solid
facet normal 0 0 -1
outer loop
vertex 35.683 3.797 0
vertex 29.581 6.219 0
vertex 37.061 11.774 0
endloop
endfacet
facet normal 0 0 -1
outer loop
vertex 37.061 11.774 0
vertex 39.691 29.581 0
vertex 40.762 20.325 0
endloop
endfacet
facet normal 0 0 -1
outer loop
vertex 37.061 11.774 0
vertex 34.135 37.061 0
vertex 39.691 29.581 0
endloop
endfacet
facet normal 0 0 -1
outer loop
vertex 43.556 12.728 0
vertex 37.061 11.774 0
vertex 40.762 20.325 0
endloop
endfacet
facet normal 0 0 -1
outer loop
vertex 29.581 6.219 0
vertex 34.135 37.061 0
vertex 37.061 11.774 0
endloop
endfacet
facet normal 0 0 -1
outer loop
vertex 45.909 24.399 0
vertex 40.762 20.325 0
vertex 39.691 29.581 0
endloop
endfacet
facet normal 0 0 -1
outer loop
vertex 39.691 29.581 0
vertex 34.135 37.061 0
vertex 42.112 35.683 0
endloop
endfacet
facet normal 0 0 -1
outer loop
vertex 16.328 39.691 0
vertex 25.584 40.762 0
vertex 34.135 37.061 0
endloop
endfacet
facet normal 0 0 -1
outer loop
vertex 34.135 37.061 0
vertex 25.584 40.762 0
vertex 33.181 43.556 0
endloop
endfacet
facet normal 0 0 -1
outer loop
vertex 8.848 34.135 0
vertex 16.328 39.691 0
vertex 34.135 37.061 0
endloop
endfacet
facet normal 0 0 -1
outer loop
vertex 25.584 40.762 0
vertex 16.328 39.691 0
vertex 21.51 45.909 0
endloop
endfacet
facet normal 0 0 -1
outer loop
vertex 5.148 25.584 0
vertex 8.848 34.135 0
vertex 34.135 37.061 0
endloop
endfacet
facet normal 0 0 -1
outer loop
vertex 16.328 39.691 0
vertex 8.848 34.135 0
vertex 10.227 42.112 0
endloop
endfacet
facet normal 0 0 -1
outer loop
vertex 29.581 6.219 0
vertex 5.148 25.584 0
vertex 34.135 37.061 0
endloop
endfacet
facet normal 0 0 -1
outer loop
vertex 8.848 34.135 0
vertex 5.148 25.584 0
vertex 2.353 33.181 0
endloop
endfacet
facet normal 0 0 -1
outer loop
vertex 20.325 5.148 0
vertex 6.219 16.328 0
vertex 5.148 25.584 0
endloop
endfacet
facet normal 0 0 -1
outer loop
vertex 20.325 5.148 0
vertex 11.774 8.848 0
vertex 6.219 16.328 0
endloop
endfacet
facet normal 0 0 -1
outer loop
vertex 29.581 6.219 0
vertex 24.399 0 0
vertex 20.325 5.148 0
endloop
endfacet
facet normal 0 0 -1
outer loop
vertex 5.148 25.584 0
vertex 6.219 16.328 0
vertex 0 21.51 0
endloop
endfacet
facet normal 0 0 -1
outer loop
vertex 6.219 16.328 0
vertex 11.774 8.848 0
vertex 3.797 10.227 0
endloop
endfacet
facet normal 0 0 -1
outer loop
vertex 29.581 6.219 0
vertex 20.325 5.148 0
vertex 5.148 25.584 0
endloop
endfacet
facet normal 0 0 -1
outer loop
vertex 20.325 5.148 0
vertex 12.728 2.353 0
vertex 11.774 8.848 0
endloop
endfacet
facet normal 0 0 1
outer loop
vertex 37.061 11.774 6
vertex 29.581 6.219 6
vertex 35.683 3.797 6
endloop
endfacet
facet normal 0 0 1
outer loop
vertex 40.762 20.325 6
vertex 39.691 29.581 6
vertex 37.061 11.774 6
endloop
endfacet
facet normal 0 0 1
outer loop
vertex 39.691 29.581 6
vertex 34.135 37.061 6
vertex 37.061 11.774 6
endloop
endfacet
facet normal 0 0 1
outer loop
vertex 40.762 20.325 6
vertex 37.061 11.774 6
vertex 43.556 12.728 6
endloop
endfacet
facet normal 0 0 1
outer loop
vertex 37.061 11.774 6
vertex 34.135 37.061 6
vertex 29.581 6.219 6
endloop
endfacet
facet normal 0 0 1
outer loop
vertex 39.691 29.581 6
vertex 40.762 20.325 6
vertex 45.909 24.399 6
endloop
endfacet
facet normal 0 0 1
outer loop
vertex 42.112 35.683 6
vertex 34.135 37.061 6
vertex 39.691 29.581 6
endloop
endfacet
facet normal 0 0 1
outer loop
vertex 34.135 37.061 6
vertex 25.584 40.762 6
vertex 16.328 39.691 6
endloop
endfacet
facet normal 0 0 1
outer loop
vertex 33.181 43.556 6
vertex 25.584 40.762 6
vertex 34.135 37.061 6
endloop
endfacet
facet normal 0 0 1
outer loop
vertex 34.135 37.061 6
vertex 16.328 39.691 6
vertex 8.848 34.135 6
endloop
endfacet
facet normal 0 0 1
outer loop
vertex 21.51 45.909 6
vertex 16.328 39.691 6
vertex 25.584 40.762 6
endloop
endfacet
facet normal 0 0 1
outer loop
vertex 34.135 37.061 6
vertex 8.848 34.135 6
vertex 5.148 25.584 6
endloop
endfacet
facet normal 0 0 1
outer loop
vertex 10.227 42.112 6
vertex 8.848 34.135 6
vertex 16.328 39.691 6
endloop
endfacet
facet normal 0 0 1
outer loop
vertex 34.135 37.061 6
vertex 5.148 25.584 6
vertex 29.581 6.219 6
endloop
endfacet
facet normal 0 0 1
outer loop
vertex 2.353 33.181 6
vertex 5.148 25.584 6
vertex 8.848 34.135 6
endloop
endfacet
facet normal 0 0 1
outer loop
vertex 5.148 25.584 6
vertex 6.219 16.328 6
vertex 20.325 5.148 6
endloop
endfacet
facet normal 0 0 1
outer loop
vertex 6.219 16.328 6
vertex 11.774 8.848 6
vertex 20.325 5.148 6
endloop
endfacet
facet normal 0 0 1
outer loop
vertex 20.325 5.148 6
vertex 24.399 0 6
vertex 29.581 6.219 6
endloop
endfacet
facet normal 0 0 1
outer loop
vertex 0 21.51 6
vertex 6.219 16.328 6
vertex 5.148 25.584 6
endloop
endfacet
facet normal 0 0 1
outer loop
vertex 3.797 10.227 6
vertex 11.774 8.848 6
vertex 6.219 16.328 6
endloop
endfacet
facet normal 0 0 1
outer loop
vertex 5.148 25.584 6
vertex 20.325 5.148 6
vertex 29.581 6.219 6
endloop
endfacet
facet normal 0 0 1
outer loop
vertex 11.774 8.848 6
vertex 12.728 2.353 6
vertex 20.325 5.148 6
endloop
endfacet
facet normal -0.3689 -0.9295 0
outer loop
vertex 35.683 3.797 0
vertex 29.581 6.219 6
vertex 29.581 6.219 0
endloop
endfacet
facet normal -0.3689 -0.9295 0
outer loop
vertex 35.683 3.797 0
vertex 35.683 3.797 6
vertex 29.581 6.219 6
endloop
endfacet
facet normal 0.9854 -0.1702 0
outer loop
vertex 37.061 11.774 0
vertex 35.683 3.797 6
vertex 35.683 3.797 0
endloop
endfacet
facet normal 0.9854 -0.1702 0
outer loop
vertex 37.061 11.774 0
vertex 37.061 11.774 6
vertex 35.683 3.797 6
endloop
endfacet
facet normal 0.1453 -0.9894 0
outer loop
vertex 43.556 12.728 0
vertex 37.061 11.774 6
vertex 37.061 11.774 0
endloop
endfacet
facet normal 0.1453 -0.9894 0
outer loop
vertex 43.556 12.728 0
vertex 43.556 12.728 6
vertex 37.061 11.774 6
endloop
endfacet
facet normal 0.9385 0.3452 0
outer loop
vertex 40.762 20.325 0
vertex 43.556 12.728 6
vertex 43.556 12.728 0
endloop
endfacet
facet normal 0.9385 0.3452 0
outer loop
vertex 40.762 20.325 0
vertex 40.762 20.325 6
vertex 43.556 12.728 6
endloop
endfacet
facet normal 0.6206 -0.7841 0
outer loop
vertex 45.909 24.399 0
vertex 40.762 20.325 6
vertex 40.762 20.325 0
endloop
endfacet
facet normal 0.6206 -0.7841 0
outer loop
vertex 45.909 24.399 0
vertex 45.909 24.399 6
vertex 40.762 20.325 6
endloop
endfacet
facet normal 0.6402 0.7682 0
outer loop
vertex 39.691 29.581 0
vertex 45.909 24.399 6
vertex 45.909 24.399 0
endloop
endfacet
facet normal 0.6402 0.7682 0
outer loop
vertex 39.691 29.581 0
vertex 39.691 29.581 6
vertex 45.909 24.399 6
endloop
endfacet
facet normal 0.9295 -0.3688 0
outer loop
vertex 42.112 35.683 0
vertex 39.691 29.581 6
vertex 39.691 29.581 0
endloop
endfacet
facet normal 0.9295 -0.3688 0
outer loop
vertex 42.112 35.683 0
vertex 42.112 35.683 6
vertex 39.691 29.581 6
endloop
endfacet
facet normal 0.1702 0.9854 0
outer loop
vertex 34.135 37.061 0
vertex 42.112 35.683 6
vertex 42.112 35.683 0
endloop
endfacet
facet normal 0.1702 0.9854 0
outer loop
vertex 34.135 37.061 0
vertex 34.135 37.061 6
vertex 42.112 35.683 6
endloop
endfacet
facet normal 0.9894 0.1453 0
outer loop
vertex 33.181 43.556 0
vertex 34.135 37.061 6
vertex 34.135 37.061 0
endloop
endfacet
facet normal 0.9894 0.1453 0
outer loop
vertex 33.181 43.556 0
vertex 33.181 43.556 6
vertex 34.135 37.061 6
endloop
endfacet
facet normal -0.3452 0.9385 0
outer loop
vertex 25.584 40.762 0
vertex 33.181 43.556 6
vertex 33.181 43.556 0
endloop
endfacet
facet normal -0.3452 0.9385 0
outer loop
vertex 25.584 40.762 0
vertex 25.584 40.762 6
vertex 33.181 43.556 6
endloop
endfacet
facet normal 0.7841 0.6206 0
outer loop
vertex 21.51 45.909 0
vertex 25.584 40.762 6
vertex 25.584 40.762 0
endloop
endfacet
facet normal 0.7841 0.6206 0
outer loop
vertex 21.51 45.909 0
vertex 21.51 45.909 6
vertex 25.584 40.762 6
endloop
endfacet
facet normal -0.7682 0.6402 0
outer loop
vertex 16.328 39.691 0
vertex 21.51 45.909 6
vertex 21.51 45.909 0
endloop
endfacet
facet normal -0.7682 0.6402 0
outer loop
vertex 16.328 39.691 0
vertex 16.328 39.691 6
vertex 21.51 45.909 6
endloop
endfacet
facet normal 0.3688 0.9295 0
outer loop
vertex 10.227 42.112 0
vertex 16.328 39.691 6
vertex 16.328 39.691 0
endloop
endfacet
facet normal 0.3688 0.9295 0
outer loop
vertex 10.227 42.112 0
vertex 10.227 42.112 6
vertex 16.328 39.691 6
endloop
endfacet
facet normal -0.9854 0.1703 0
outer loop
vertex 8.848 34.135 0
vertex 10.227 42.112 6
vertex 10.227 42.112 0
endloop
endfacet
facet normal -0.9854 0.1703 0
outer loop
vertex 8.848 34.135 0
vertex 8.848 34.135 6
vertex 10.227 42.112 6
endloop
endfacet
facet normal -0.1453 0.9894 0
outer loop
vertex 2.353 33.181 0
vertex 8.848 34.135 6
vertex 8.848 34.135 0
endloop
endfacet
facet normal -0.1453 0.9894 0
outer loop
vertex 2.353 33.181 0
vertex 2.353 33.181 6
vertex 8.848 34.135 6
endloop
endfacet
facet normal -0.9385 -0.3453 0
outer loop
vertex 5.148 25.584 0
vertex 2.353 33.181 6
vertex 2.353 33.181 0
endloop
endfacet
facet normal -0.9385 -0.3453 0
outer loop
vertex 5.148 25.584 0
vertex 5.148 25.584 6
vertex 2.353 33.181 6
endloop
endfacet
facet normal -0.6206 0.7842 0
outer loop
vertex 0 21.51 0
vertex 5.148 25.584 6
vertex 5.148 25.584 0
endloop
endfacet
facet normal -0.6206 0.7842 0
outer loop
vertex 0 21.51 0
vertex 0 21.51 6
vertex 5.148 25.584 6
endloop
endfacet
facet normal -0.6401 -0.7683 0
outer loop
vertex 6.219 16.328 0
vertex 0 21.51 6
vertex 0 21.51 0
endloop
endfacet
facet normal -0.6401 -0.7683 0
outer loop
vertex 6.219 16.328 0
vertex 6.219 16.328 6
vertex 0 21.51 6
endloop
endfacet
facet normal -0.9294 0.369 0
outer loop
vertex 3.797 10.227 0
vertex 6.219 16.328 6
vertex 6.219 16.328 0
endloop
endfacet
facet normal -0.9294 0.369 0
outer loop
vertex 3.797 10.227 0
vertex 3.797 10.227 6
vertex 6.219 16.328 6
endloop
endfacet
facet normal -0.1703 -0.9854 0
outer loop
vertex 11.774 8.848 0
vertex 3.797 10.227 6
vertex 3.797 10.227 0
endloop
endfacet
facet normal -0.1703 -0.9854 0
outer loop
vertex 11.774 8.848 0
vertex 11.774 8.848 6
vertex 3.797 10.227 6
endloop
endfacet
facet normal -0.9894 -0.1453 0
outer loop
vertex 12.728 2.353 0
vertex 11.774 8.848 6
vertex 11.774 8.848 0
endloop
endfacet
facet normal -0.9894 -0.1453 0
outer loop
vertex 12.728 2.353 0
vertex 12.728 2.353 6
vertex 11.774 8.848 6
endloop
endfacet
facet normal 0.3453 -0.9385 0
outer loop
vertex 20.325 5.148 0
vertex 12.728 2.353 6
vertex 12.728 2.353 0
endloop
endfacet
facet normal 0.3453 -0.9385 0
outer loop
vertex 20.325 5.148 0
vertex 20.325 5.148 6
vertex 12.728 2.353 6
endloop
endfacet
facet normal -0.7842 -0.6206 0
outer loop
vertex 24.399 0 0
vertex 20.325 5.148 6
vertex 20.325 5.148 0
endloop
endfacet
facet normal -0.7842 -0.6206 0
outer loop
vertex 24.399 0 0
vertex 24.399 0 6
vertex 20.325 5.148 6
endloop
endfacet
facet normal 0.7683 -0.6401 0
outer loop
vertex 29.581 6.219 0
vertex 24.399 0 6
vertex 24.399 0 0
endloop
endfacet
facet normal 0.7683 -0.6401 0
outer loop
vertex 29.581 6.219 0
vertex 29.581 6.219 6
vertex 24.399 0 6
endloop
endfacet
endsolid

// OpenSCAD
$fn = 32;

// ----------------------------------------------------------------------
// Chain sprocket: 12 teeth, 18 mm root radius
// ----------------------------------------------------------------------

// --- parameters (mm) ---
profile_height = 6;       // extrusion height
profile_points = 24;      // points of the closed outline

profile = [[40.762, 20.325], [45.909, 24.399], [39.691, 29.581], [42.112, 35.683], [34.135, 37.061], [33.181, 43.556], [25.584, 40.762], [21.51, 45.909], [16.328, 39.691], [10.227, 42.112], [8.848, 34.135], [2.353, 33.181], [5.148, 25.584], [0, 21.51], [6.219, 16.328], [3.797, 10.227], [11.774, 8.848], [12.728, 2.353], [20.325, 5.148], [24.399, 0], [29.581, 6.219], [35.683, 3.797], [37.061, 11.774], [43.556, 12.728]];  // single closed polygon, 24 points, counter clockwise

// --- the one profile operation ---
linear_extrude(height = profile_height) polygon(points = profile);
